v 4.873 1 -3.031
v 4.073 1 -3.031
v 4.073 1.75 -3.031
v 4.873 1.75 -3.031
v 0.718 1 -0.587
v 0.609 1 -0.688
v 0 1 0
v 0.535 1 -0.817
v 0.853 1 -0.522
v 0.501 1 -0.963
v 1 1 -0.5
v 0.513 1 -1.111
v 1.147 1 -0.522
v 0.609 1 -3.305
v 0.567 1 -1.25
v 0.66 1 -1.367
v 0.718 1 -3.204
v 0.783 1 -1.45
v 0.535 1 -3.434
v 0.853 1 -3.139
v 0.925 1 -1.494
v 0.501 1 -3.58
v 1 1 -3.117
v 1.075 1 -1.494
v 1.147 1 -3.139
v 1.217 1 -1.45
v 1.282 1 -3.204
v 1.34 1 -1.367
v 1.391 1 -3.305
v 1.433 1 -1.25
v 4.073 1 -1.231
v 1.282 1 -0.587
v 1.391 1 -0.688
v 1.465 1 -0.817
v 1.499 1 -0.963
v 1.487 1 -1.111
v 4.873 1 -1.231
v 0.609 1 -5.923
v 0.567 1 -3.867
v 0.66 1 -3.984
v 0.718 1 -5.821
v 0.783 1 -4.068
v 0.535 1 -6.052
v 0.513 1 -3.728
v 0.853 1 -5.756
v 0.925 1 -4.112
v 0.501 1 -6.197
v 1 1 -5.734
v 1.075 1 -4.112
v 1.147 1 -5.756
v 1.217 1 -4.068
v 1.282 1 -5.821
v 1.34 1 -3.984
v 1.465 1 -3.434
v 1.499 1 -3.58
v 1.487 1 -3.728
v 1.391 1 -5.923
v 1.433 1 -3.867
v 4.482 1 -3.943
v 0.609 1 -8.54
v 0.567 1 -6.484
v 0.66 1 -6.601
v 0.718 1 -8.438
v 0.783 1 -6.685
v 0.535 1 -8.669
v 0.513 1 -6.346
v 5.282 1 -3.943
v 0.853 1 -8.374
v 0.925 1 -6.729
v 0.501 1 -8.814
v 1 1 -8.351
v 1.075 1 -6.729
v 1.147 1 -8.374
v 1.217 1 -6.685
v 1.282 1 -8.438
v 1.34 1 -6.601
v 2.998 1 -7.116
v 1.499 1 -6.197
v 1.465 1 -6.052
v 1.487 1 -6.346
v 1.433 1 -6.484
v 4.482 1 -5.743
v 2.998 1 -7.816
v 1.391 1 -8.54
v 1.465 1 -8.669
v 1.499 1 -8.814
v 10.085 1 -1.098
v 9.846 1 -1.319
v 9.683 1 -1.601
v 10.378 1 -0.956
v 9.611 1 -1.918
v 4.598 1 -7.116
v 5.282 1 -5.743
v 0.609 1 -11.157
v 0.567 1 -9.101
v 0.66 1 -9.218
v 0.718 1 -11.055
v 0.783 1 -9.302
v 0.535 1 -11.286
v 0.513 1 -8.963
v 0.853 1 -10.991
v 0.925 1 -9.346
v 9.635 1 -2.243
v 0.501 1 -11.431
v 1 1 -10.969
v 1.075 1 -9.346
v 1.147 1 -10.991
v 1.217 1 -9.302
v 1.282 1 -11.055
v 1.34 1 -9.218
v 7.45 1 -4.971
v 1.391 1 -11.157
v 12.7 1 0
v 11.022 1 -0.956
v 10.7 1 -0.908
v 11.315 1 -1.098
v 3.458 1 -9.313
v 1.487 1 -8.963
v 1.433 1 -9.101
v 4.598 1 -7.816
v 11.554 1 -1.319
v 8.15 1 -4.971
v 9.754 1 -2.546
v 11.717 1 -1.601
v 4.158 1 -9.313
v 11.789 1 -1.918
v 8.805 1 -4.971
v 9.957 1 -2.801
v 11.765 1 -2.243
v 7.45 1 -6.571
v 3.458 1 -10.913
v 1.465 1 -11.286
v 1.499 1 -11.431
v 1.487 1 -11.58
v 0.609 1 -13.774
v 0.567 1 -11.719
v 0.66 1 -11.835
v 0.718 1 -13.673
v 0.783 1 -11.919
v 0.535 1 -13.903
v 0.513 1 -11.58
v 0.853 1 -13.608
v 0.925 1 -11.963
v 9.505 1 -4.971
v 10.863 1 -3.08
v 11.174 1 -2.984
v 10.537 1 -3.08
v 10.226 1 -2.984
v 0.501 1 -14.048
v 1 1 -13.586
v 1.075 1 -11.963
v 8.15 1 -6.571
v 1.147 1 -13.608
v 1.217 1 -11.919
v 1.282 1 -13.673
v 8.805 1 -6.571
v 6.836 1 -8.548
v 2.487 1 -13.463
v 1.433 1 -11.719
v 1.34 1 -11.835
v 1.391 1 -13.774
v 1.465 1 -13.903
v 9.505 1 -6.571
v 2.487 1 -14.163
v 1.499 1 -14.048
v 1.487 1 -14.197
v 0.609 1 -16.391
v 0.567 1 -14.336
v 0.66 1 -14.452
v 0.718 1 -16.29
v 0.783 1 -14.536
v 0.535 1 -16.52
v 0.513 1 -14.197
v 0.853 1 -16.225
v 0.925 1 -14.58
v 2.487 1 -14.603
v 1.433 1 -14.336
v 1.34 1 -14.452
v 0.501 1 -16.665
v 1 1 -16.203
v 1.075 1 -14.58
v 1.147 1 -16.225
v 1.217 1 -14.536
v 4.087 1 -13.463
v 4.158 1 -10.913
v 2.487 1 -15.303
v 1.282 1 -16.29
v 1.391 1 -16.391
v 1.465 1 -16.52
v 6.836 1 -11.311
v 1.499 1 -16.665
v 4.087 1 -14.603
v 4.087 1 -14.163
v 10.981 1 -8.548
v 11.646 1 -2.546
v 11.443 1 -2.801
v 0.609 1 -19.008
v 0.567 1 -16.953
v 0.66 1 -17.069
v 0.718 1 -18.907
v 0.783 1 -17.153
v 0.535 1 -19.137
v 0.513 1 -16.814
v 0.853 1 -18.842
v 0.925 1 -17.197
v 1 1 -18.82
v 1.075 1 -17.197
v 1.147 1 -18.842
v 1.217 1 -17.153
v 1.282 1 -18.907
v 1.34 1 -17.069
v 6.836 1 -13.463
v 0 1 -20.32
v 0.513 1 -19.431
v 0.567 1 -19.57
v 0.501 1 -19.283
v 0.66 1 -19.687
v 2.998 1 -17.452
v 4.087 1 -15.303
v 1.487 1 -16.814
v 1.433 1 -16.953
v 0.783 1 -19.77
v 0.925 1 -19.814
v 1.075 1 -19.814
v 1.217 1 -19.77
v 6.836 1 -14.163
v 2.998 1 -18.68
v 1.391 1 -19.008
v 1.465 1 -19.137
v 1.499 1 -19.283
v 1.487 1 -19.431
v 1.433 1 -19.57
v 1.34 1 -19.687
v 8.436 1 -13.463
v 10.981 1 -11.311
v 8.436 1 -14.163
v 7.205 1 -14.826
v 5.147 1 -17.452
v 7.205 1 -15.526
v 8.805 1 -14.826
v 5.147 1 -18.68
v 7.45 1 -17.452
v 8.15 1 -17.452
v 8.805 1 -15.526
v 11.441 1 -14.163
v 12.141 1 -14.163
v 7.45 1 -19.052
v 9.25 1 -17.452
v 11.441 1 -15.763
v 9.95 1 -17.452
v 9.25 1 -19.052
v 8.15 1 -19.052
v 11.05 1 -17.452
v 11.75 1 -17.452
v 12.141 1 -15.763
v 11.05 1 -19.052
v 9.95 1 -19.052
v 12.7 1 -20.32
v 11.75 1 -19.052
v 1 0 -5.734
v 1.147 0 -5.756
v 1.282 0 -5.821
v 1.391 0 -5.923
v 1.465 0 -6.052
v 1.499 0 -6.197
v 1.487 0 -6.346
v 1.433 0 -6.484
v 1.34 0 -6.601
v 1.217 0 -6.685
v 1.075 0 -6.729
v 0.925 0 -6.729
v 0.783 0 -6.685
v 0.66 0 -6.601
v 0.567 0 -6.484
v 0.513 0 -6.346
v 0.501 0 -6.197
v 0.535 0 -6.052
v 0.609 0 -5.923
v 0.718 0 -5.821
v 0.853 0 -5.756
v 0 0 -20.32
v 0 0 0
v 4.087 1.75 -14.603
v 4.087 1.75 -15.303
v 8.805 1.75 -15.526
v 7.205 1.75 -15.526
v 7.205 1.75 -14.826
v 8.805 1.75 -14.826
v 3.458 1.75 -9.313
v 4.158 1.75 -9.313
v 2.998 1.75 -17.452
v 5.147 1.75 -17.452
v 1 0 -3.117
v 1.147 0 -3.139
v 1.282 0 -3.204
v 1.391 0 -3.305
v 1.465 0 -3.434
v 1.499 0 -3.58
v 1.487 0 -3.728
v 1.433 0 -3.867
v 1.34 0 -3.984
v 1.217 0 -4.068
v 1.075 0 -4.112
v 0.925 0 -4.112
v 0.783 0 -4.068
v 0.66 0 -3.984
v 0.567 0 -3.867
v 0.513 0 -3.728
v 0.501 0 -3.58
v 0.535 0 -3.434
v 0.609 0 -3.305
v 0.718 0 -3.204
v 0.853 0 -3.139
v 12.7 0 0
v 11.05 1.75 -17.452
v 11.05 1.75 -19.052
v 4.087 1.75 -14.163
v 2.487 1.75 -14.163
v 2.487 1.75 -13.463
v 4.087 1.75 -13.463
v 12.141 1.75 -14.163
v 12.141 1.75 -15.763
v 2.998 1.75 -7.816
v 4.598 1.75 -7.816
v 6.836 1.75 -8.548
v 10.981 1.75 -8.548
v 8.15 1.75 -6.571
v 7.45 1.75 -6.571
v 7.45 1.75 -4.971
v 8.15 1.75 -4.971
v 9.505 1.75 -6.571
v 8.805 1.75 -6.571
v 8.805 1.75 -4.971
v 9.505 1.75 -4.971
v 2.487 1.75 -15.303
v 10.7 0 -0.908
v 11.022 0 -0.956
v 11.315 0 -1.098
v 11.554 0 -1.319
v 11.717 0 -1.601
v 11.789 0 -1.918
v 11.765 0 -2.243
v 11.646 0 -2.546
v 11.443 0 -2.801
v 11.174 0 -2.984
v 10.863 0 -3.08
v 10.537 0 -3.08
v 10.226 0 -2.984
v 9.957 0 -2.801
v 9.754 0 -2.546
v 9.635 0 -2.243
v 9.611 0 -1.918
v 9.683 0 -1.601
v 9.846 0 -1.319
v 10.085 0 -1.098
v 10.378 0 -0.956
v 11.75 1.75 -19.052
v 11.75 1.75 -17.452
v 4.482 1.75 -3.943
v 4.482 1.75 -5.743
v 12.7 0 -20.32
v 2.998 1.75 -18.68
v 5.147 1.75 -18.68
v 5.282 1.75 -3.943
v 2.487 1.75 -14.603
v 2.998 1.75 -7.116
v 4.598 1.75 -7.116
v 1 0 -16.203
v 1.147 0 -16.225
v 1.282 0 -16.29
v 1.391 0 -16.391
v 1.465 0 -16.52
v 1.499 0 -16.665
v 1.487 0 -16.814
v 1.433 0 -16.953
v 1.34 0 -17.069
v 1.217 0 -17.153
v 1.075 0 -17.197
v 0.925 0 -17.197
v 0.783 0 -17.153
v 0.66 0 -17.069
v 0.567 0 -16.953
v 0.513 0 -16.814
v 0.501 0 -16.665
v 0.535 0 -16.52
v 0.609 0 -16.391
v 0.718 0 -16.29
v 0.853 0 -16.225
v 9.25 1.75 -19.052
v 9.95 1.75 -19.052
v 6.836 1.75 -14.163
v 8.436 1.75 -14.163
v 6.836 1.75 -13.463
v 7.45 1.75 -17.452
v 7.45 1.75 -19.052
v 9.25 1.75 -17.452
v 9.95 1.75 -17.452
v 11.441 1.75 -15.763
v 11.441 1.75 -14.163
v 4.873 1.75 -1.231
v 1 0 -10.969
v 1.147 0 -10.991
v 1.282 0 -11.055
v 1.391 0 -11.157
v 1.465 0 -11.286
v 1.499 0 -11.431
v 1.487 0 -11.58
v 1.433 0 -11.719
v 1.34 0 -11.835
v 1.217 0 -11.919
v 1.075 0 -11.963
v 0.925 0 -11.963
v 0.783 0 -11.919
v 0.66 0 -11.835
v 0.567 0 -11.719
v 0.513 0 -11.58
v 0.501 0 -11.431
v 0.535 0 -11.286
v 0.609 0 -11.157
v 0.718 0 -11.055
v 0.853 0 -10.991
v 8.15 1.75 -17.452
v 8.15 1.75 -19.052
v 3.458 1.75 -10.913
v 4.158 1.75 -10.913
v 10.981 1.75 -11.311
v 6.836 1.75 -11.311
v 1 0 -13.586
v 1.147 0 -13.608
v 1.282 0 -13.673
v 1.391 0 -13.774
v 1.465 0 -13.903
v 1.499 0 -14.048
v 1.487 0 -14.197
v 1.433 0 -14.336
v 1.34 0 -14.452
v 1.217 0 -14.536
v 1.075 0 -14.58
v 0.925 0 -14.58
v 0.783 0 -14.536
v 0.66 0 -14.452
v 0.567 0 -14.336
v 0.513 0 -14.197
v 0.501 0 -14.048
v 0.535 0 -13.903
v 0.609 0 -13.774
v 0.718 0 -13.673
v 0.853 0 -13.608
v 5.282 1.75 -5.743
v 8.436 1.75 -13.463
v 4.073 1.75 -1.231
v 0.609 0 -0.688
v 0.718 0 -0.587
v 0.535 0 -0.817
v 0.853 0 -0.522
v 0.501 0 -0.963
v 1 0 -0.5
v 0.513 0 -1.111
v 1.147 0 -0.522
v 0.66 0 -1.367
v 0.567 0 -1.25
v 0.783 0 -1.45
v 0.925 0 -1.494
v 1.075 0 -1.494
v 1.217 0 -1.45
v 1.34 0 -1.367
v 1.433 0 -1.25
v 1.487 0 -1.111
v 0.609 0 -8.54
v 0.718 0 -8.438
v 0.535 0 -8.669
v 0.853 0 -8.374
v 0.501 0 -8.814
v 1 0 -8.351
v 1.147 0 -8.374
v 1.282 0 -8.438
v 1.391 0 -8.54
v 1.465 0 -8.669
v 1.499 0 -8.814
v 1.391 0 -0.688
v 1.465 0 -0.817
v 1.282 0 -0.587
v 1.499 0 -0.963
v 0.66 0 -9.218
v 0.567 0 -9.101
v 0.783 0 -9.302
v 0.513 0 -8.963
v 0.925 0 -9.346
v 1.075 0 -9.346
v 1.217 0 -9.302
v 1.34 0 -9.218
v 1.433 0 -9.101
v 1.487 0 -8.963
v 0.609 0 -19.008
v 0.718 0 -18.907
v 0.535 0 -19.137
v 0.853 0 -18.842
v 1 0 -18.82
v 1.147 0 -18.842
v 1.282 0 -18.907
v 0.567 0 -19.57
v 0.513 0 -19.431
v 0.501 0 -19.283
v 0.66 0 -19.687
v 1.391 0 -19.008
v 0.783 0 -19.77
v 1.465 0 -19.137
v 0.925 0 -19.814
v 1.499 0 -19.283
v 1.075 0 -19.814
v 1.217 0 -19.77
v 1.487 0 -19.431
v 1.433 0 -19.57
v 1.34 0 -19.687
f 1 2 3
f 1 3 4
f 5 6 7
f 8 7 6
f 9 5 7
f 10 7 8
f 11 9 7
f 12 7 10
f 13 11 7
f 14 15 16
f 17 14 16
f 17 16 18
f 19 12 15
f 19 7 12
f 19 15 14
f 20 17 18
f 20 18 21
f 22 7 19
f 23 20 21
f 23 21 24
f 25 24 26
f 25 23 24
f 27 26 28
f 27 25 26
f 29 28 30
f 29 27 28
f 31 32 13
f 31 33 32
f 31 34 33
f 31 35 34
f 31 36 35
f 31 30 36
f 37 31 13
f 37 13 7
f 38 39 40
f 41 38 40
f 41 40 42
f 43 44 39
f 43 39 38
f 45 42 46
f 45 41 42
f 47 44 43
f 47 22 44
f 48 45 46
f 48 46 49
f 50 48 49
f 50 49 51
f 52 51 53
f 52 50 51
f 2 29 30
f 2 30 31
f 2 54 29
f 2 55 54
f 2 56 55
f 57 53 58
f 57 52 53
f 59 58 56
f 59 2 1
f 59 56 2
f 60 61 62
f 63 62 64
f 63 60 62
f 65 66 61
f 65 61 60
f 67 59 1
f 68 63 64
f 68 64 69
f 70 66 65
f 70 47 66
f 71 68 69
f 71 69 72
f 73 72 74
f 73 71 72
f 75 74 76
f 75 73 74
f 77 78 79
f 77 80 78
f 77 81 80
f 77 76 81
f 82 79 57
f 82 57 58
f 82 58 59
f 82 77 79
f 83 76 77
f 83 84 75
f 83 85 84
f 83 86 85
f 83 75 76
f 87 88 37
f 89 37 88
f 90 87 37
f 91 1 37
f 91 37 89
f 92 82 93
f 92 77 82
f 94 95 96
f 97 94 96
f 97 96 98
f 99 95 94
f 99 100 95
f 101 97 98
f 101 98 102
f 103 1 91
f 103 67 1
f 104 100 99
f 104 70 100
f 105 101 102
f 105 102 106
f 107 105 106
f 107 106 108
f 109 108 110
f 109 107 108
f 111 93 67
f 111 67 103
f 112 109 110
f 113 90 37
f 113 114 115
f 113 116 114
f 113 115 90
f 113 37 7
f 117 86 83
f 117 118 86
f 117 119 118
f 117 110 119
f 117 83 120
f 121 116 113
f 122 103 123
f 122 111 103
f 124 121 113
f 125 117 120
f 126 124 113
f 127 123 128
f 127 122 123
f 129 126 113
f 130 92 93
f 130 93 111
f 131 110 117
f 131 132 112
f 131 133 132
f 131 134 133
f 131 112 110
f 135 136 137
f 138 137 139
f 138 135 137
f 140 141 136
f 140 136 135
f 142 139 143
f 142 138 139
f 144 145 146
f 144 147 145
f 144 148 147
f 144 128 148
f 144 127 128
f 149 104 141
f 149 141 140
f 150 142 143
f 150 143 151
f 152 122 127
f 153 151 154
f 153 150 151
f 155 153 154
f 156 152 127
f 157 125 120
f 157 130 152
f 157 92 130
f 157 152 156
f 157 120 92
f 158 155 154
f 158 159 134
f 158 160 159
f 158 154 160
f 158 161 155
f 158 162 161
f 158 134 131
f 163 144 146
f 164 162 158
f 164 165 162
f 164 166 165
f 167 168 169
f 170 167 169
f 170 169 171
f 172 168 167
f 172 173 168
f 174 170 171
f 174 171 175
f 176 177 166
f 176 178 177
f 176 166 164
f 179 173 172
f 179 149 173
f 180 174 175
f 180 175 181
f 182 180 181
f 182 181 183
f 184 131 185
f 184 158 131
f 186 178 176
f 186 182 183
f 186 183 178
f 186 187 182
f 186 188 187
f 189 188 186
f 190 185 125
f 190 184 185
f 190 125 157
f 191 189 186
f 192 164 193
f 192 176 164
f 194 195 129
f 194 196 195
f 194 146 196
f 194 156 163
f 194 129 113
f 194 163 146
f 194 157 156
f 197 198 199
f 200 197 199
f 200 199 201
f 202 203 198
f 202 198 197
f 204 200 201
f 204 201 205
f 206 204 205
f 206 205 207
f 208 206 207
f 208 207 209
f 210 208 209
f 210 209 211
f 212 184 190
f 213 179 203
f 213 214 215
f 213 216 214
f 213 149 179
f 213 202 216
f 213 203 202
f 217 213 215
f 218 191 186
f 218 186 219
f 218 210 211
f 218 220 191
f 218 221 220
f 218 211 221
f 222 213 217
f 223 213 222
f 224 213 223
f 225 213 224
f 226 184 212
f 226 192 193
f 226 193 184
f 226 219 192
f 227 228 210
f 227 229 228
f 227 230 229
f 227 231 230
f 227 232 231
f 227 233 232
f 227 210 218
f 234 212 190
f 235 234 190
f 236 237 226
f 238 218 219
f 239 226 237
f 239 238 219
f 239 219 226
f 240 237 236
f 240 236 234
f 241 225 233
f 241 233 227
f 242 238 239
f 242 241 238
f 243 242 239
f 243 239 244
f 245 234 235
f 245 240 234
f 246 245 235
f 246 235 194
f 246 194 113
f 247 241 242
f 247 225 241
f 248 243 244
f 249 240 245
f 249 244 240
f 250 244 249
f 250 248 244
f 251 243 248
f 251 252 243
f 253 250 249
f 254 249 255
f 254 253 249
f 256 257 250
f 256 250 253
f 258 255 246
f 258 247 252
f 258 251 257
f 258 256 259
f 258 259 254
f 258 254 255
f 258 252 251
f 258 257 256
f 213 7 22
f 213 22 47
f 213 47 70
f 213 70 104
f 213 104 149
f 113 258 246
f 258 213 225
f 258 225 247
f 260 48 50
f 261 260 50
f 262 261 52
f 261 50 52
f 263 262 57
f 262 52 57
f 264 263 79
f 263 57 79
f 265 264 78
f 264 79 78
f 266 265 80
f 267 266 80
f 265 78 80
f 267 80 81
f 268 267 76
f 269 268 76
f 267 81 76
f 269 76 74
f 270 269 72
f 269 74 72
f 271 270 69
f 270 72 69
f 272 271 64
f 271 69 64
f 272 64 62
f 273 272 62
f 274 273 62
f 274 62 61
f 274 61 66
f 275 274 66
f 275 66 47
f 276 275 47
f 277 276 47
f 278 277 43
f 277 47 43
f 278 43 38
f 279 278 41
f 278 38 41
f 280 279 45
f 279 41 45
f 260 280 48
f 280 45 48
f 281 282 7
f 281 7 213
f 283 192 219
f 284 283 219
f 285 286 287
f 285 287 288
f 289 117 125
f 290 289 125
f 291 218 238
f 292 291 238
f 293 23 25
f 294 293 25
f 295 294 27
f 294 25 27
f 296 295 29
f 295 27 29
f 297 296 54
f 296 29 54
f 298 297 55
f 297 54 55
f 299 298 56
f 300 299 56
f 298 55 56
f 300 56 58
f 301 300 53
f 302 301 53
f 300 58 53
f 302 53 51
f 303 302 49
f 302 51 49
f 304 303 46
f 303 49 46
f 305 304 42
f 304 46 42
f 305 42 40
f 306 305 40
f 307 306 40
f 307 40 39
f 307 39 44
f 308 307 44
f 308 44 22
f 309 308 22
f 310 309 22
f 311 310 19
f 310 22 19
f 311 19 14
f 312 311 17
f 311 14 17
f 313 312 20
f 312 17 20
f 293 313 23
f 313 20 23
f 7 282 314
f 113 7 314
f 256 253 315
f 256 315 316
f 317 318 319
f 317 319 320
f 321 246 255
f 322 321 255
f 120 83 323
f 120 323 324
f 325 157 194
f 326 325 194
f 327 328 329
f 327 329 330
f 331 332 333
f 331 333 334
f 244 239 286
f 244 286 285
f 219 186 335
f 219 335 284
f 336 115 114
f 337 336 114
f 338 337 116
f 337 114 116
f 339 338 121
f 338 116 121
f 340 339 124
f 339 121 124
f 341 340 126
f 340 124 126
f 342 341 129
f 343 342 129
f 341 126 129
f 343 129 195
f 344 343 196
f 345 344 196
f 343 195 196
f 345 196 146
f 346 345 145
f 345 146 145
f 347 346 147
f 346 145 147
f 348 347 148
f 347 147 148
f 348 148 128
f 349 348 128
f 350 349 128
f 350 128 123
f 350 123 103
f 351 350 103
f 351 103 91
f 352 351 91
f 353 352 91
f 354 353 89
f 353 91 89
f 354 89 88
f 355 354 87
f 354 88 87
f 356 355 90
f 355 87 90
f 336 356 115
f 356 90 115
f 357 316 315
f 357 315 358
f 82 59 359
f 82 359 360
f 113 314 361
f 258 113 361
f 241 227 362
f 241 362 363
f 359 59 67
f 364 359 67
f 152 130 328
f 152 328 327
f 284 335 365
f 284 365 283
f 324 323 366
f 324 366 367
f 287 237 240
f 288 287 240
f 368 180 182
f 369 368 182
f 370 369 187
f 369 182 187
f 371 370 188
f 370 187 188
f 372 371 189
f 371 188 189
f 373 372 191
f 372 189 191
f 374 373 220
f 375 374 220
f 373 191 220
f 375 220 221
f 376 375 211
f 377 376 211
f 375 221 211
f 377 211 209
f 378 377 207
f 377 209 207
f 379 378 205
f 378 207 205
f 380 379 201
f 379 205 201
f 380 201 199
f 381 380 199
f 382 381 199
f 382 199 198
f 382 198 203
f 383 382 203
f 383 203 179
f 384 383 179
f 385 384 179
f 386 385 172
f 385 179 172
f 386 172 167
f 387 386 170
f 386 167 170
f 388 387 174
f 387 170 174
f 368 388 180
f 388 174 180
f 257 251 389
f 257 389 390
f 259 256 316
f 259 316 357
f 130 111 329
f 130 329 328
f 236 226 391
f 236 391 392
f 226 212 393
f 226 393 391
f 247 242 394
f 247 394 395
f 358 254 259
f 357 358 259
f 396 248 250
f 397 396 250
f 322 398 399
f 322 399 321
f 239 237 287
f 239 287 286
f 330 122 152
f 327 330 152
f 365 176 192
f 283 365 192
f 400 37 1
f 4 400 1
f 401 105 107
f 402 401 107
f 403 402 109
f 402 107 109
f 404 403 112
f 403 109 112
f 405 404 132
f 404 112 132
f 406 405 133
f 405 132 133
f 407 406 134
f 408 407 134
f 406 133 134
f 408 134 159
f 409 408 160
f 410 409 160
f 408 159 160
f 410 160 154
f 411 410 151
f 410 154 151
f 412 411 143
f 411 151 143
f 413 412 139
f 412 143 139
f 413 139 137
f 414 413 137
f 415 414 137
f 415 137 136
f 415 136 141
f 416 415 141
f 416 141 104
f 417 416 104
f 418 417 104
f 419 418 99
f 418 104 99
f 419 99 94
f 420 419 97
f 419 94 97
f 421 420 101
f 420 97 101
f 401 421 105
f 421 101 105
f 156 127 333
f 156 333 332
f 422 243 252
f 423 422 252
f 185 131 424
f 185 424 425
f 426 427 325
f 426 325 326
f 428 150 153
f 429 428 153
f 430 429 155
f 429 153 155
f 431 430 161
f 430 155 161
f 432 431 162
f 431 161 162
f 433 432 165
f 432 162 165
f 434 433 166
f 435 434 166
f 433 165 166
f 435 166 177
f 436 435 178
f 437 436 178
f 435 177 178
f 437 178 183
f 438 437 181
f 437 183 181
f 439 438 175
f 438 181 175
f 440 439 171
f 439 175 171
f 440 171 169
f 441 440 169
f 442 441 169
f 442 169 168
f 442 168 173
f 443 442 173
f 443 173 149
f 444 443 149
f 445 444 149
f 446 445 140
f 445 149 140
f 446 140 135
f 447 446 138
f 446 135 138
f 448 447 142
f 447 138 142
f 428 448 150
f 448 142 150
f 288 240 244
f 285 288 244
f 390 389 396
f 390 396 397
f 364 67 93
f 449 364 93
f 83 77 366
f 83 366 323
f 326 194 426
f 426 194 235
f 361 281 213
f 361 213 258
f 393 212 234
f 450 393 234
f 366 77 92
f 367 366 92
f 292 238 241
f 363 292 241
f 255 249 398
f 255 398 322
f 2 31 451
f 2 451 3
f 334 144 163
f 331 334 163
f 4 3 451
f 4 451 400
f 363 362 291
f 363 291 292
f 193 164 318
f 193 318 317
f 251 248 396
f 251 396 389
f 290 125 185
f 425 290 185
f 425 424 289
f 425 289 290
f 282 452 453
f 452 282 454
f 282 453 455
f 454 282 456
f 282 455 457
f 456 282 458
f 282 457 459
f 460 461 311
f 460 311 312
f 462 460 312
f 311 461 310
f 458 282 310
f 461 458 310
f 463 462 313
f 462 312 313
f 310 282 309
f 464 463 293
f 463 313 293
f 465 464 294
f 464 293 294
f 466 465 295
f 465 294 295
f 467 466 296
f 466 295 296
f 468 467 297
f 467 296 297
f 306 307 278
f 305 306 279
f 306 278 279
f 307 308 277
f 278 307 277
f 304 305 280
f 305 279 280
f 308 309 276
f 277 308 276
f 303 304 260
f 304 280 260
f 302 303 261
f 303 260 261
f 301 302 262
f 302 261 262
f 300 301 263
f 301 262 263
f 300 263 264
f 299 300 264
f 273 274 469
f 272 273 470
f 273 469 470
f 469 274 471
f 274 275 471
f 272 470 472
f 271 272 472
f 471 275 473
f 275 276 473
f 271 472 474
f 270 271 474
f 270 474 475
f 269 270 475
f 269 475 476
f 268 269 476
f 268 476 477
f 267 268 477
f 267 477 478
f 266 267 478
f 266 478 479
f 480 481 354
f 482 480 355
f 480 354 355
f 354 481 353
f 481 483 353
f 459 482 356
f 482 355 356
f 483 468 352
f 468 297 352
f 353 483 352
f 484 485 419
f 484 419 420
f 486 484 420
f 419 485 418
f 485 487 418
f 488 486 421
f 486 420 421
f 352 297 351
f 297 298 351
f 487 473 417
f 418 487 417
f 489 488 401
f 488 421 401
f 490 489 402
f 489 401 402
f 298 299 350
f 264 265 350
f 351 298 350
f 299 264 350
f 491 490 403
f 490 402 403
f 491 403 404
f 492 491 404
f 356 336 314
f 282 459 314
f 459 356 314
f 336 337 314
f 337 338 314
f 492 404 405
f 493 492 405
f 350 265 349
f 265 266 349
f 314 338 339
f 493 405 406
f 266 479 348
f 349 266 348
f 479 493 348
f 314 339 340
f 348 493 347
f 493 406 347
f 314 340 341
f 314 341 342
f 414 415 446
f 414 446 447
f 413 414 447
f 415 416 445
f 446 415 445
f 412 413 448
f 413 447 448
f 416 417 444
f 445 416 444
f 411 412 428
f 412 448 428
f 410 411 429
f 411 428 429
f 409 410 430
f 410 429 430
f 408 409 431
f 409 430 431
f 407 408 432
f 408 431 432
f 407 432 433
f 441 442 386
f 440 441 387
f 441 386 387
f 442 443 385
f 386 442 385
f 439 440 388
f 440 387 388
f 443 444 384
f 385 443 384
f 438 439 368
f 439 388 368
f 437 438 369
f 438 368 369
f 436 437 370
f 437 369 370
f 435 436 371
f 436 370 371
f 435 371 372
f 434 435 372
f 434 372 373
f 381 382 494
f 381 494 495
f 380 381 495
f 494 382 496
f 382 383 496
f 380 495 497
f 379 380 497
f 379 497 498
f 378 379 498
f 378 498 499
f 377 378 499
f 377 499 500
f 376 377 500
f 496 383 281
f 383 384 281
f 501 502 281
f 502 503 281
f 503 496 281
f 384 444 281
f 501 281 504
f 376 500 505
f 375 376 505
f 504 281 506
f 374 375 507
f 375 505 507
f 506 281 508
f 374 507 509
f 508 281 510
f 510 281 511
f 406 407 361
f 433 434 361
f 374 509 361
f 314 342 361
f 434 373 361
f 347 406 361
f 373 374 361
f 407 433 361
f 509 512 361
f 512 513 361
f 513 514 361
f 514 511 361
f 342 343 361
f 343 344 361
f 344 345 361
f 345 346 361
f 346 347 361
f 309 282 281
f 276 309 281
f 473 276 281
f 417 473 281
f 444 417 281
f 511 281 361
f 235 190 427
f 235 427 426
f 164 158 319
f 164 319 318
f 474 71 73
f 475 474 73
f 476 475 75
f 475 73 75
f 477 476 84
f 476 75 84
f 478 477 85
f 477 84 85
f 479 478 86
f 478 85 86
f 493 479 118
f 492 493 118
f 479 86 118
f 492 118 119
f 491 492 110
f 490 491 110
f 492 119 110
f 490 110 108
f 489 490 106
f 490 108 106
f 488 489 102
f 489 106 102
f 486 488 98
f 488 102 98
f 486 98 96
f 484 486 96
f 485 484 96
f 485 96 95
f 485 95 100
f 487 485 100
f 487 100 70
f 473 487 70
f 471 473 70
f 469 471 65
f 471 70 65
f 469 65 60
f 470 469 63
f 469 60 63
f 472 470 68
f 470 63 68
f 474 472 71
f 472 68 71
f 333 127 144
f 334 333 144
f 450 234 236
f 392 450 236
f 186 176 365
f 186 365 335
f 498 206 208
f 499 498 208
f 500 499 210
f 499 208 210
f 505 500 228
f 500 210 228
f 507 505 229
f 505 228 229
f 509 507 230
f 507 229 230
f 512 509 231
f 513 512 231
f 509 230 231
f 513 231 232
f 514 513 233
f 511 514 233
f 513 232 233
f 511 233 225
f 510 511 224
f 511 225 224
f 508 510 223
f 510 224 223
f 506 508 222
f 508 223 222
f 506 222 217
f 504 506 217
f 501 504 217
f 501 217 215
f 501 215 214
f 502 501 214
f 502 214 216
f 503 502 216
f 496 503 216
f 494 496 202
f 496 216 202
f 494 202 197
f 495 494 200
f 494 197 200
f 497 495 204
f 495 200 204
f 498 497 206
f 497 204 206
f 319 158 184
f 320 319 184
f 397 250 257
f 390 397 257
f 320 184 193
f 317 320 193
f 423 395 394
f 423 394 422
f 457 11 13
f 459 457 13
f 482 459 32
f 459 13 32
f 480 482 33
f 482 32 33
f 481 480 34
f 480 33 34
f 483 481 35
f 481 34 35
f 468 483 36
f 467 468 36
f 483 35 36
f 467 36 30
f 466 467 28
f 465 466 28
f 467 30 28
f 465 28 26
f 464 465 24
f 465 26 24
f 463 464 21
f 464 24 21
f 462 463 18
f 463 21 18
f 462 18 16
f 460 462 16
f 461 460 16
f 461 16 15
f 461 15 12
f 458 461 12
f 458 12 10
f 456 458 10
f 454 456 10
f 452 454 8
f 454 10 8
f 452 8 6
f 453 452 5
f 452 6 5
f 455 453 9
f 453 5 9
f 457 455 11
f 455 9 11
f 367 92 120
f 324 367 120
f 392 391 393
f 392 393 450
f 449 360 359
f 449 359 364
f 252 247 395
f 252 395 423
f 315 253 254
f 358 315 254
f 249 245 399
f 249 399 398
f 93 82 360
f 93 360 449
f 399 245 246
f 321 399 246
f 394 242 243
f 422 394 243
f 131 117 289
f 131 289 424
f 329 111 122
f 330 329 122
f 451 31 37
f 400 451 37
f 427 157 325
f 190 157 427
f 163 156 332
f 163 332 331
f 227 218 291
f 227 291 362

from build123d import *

# Parameters (mm, degrees)
SKETCH1_W           = 12.7
SKETCH1_H           = 20.32
BOSS_EXTRUDE1_DEPTH = 1
SKETCH2_R           = 0.5
SKETCH2_R_2         = 1.0922
CUT_EXTRUDE2_DEPTH  = 1
SKETCH3_W           = 0.7
SKETCH3_H           = 1.6
SKETCH3_W_2         = 2.149156966
SKETCH3_H_2         = 1.228089695
SKETCH3_W_3         = 4.14480272
SKETCH3_H_3         = 2.763201813
SKETCH3_W_4         = 0.8
SKETCH3_H_4         = 1.8
SKETCH3_W_5         = 1.6
SKETCH3_H_5         = 0.7
BOSS_EXTRUDE3_DEPTH = 0.75


with BuildPart() as part:
    # Sketch1 → Boss-Extrude1 (new body)
    with BuildSketch(Plane(origin=(0, 0, 0), x_dir=(1, 0, 0), z_dir=(0, 1, 0))):
        with Locations((6.35, 10.16)):
            Rectangle(SKETCH1_W, SKETCH1_H)
    extrude(amount=BOSS_EXTRUDE1_DEPTH)

    # Sketch2 → Cut-Extrude2 (cut)
    with BuildSketch(Plane(origin=(0, 1, 0), x_dir=(1, 0, 0), z_dir=(0, 1, 0))):
        with Locations(Location((1, 19.32, 0), (0, 0, 270))):
            Circle(SKETCH2_R)
        with Locations(Location((1, 16.702857143, 0), (0, 0, 270))):
            Circle(SKETCH2_R)
        with Locations(Location((1, 14.085714286, 0), (0, 0, 270))):
            Circle(SKETCH2_R)
        with Locations(Location((1, 11.468571429, 0), (0, 0, 270))):
            Circle(SKETCH2_R)
        with Locations(Location((1, 8.851428571, 0), (0, 0, 270))):
            Circle(SKETCH2_R)
        with Locations(Location((1, 6.234285714, 0), (0, 0, 270))):
            Circle(SKETCH2_R)
        with Locations(Location((1, 3.617142857, 0), (0, 0, 270))):
            Circle(SKETCH2_R)
        with Locations(Location((1, 1, 0), (0, 0, 270))):
            Circle(SKETCH2_R)
        with Locations(Location((10.7, 2, 0), (0, 0, 270))):
            Circle(SKETCH2_R_2)
    extrude(amount=-CUT_EXTRUDE2_DEPTH, mode=Mode.SUBTRACT)

    # Sketch3 → Boss-Extrude3 (add)
    with BuildSketch(Plane(origin=(0, 1, 0), x_dir=(1, 0, 0), z_dir=(0, 1, 0))):
        with Locations((9.600163685, 18.251782562)):
            Rectangle(SKETCH3_W, SKETCH3_H)
        with Locations((4.072917024, 18.06582741)):
            Rectangle(SKETCH3_W_2, SKETCH3_H_2)
        with Locations((8.908520197, 9.929733183)):
            Rectangle(SKETCH3_W_3, SKETCH3_H_3)
        with Locations((4.882280256, 4.84279592)):
            Rectangle(SKETCH3_W_4, SKETCH3_H_4)
        with Locations((4.472917024, 2.130764511)):
            Rectangle(SKETCH3_W_4, SKETCH3_H_4)
        with Locations((7.800163685, 18.251782562)):
            Rectangle(SKETCH3_W, SKETCH3_H)
        with Locations((11.400163685, 18.251782562)):
            Rectangle(SKETCH3_W, SKETCH3_H)
        with Locations((11.791455193, 14.963159232)):
            Rectangle(SKETCH3_W, SKETCH3_H)
        with Locations((3.286634502, 14.952625597)):
            Rectangle(SKETCH3_W_5, SKETCH3_H_5)
        with Locations((3.286634502, 13.813159232)):
            Rectangle(SKETCH3_W_5, SKETCH3_H_5)
        with Locations((8.005018674, 15.176499715)):
            Rectangle(SKETCH3_W_5, SKETCH3_H_5)
        with Locations((7.636118837, 13.813159232)):
            Rectangle(SKETCH3_W_5, SKETCH3_H_5)
        with Locations((3.808428935, 10.112643834)):
            Rectangle(SKETCH3_W, SKETCH3_H)
        with Locations((7.800163685, 5.771046806)):
            Rectangle(SKETCH3_W, SKETCH3_H)
        with Locations((9.155018674, 5.771046806)):
            Rectangle(SKETCH3_W, SKETCH3_H)
        with Locations((3.798338541, 7.466211291)):
            Rectangle(SKETCH3_W_5, SKETCH3_H_5)
    extrude(amount=BOSS_EXTRUDE3_DEPTH)


solid = part.part
